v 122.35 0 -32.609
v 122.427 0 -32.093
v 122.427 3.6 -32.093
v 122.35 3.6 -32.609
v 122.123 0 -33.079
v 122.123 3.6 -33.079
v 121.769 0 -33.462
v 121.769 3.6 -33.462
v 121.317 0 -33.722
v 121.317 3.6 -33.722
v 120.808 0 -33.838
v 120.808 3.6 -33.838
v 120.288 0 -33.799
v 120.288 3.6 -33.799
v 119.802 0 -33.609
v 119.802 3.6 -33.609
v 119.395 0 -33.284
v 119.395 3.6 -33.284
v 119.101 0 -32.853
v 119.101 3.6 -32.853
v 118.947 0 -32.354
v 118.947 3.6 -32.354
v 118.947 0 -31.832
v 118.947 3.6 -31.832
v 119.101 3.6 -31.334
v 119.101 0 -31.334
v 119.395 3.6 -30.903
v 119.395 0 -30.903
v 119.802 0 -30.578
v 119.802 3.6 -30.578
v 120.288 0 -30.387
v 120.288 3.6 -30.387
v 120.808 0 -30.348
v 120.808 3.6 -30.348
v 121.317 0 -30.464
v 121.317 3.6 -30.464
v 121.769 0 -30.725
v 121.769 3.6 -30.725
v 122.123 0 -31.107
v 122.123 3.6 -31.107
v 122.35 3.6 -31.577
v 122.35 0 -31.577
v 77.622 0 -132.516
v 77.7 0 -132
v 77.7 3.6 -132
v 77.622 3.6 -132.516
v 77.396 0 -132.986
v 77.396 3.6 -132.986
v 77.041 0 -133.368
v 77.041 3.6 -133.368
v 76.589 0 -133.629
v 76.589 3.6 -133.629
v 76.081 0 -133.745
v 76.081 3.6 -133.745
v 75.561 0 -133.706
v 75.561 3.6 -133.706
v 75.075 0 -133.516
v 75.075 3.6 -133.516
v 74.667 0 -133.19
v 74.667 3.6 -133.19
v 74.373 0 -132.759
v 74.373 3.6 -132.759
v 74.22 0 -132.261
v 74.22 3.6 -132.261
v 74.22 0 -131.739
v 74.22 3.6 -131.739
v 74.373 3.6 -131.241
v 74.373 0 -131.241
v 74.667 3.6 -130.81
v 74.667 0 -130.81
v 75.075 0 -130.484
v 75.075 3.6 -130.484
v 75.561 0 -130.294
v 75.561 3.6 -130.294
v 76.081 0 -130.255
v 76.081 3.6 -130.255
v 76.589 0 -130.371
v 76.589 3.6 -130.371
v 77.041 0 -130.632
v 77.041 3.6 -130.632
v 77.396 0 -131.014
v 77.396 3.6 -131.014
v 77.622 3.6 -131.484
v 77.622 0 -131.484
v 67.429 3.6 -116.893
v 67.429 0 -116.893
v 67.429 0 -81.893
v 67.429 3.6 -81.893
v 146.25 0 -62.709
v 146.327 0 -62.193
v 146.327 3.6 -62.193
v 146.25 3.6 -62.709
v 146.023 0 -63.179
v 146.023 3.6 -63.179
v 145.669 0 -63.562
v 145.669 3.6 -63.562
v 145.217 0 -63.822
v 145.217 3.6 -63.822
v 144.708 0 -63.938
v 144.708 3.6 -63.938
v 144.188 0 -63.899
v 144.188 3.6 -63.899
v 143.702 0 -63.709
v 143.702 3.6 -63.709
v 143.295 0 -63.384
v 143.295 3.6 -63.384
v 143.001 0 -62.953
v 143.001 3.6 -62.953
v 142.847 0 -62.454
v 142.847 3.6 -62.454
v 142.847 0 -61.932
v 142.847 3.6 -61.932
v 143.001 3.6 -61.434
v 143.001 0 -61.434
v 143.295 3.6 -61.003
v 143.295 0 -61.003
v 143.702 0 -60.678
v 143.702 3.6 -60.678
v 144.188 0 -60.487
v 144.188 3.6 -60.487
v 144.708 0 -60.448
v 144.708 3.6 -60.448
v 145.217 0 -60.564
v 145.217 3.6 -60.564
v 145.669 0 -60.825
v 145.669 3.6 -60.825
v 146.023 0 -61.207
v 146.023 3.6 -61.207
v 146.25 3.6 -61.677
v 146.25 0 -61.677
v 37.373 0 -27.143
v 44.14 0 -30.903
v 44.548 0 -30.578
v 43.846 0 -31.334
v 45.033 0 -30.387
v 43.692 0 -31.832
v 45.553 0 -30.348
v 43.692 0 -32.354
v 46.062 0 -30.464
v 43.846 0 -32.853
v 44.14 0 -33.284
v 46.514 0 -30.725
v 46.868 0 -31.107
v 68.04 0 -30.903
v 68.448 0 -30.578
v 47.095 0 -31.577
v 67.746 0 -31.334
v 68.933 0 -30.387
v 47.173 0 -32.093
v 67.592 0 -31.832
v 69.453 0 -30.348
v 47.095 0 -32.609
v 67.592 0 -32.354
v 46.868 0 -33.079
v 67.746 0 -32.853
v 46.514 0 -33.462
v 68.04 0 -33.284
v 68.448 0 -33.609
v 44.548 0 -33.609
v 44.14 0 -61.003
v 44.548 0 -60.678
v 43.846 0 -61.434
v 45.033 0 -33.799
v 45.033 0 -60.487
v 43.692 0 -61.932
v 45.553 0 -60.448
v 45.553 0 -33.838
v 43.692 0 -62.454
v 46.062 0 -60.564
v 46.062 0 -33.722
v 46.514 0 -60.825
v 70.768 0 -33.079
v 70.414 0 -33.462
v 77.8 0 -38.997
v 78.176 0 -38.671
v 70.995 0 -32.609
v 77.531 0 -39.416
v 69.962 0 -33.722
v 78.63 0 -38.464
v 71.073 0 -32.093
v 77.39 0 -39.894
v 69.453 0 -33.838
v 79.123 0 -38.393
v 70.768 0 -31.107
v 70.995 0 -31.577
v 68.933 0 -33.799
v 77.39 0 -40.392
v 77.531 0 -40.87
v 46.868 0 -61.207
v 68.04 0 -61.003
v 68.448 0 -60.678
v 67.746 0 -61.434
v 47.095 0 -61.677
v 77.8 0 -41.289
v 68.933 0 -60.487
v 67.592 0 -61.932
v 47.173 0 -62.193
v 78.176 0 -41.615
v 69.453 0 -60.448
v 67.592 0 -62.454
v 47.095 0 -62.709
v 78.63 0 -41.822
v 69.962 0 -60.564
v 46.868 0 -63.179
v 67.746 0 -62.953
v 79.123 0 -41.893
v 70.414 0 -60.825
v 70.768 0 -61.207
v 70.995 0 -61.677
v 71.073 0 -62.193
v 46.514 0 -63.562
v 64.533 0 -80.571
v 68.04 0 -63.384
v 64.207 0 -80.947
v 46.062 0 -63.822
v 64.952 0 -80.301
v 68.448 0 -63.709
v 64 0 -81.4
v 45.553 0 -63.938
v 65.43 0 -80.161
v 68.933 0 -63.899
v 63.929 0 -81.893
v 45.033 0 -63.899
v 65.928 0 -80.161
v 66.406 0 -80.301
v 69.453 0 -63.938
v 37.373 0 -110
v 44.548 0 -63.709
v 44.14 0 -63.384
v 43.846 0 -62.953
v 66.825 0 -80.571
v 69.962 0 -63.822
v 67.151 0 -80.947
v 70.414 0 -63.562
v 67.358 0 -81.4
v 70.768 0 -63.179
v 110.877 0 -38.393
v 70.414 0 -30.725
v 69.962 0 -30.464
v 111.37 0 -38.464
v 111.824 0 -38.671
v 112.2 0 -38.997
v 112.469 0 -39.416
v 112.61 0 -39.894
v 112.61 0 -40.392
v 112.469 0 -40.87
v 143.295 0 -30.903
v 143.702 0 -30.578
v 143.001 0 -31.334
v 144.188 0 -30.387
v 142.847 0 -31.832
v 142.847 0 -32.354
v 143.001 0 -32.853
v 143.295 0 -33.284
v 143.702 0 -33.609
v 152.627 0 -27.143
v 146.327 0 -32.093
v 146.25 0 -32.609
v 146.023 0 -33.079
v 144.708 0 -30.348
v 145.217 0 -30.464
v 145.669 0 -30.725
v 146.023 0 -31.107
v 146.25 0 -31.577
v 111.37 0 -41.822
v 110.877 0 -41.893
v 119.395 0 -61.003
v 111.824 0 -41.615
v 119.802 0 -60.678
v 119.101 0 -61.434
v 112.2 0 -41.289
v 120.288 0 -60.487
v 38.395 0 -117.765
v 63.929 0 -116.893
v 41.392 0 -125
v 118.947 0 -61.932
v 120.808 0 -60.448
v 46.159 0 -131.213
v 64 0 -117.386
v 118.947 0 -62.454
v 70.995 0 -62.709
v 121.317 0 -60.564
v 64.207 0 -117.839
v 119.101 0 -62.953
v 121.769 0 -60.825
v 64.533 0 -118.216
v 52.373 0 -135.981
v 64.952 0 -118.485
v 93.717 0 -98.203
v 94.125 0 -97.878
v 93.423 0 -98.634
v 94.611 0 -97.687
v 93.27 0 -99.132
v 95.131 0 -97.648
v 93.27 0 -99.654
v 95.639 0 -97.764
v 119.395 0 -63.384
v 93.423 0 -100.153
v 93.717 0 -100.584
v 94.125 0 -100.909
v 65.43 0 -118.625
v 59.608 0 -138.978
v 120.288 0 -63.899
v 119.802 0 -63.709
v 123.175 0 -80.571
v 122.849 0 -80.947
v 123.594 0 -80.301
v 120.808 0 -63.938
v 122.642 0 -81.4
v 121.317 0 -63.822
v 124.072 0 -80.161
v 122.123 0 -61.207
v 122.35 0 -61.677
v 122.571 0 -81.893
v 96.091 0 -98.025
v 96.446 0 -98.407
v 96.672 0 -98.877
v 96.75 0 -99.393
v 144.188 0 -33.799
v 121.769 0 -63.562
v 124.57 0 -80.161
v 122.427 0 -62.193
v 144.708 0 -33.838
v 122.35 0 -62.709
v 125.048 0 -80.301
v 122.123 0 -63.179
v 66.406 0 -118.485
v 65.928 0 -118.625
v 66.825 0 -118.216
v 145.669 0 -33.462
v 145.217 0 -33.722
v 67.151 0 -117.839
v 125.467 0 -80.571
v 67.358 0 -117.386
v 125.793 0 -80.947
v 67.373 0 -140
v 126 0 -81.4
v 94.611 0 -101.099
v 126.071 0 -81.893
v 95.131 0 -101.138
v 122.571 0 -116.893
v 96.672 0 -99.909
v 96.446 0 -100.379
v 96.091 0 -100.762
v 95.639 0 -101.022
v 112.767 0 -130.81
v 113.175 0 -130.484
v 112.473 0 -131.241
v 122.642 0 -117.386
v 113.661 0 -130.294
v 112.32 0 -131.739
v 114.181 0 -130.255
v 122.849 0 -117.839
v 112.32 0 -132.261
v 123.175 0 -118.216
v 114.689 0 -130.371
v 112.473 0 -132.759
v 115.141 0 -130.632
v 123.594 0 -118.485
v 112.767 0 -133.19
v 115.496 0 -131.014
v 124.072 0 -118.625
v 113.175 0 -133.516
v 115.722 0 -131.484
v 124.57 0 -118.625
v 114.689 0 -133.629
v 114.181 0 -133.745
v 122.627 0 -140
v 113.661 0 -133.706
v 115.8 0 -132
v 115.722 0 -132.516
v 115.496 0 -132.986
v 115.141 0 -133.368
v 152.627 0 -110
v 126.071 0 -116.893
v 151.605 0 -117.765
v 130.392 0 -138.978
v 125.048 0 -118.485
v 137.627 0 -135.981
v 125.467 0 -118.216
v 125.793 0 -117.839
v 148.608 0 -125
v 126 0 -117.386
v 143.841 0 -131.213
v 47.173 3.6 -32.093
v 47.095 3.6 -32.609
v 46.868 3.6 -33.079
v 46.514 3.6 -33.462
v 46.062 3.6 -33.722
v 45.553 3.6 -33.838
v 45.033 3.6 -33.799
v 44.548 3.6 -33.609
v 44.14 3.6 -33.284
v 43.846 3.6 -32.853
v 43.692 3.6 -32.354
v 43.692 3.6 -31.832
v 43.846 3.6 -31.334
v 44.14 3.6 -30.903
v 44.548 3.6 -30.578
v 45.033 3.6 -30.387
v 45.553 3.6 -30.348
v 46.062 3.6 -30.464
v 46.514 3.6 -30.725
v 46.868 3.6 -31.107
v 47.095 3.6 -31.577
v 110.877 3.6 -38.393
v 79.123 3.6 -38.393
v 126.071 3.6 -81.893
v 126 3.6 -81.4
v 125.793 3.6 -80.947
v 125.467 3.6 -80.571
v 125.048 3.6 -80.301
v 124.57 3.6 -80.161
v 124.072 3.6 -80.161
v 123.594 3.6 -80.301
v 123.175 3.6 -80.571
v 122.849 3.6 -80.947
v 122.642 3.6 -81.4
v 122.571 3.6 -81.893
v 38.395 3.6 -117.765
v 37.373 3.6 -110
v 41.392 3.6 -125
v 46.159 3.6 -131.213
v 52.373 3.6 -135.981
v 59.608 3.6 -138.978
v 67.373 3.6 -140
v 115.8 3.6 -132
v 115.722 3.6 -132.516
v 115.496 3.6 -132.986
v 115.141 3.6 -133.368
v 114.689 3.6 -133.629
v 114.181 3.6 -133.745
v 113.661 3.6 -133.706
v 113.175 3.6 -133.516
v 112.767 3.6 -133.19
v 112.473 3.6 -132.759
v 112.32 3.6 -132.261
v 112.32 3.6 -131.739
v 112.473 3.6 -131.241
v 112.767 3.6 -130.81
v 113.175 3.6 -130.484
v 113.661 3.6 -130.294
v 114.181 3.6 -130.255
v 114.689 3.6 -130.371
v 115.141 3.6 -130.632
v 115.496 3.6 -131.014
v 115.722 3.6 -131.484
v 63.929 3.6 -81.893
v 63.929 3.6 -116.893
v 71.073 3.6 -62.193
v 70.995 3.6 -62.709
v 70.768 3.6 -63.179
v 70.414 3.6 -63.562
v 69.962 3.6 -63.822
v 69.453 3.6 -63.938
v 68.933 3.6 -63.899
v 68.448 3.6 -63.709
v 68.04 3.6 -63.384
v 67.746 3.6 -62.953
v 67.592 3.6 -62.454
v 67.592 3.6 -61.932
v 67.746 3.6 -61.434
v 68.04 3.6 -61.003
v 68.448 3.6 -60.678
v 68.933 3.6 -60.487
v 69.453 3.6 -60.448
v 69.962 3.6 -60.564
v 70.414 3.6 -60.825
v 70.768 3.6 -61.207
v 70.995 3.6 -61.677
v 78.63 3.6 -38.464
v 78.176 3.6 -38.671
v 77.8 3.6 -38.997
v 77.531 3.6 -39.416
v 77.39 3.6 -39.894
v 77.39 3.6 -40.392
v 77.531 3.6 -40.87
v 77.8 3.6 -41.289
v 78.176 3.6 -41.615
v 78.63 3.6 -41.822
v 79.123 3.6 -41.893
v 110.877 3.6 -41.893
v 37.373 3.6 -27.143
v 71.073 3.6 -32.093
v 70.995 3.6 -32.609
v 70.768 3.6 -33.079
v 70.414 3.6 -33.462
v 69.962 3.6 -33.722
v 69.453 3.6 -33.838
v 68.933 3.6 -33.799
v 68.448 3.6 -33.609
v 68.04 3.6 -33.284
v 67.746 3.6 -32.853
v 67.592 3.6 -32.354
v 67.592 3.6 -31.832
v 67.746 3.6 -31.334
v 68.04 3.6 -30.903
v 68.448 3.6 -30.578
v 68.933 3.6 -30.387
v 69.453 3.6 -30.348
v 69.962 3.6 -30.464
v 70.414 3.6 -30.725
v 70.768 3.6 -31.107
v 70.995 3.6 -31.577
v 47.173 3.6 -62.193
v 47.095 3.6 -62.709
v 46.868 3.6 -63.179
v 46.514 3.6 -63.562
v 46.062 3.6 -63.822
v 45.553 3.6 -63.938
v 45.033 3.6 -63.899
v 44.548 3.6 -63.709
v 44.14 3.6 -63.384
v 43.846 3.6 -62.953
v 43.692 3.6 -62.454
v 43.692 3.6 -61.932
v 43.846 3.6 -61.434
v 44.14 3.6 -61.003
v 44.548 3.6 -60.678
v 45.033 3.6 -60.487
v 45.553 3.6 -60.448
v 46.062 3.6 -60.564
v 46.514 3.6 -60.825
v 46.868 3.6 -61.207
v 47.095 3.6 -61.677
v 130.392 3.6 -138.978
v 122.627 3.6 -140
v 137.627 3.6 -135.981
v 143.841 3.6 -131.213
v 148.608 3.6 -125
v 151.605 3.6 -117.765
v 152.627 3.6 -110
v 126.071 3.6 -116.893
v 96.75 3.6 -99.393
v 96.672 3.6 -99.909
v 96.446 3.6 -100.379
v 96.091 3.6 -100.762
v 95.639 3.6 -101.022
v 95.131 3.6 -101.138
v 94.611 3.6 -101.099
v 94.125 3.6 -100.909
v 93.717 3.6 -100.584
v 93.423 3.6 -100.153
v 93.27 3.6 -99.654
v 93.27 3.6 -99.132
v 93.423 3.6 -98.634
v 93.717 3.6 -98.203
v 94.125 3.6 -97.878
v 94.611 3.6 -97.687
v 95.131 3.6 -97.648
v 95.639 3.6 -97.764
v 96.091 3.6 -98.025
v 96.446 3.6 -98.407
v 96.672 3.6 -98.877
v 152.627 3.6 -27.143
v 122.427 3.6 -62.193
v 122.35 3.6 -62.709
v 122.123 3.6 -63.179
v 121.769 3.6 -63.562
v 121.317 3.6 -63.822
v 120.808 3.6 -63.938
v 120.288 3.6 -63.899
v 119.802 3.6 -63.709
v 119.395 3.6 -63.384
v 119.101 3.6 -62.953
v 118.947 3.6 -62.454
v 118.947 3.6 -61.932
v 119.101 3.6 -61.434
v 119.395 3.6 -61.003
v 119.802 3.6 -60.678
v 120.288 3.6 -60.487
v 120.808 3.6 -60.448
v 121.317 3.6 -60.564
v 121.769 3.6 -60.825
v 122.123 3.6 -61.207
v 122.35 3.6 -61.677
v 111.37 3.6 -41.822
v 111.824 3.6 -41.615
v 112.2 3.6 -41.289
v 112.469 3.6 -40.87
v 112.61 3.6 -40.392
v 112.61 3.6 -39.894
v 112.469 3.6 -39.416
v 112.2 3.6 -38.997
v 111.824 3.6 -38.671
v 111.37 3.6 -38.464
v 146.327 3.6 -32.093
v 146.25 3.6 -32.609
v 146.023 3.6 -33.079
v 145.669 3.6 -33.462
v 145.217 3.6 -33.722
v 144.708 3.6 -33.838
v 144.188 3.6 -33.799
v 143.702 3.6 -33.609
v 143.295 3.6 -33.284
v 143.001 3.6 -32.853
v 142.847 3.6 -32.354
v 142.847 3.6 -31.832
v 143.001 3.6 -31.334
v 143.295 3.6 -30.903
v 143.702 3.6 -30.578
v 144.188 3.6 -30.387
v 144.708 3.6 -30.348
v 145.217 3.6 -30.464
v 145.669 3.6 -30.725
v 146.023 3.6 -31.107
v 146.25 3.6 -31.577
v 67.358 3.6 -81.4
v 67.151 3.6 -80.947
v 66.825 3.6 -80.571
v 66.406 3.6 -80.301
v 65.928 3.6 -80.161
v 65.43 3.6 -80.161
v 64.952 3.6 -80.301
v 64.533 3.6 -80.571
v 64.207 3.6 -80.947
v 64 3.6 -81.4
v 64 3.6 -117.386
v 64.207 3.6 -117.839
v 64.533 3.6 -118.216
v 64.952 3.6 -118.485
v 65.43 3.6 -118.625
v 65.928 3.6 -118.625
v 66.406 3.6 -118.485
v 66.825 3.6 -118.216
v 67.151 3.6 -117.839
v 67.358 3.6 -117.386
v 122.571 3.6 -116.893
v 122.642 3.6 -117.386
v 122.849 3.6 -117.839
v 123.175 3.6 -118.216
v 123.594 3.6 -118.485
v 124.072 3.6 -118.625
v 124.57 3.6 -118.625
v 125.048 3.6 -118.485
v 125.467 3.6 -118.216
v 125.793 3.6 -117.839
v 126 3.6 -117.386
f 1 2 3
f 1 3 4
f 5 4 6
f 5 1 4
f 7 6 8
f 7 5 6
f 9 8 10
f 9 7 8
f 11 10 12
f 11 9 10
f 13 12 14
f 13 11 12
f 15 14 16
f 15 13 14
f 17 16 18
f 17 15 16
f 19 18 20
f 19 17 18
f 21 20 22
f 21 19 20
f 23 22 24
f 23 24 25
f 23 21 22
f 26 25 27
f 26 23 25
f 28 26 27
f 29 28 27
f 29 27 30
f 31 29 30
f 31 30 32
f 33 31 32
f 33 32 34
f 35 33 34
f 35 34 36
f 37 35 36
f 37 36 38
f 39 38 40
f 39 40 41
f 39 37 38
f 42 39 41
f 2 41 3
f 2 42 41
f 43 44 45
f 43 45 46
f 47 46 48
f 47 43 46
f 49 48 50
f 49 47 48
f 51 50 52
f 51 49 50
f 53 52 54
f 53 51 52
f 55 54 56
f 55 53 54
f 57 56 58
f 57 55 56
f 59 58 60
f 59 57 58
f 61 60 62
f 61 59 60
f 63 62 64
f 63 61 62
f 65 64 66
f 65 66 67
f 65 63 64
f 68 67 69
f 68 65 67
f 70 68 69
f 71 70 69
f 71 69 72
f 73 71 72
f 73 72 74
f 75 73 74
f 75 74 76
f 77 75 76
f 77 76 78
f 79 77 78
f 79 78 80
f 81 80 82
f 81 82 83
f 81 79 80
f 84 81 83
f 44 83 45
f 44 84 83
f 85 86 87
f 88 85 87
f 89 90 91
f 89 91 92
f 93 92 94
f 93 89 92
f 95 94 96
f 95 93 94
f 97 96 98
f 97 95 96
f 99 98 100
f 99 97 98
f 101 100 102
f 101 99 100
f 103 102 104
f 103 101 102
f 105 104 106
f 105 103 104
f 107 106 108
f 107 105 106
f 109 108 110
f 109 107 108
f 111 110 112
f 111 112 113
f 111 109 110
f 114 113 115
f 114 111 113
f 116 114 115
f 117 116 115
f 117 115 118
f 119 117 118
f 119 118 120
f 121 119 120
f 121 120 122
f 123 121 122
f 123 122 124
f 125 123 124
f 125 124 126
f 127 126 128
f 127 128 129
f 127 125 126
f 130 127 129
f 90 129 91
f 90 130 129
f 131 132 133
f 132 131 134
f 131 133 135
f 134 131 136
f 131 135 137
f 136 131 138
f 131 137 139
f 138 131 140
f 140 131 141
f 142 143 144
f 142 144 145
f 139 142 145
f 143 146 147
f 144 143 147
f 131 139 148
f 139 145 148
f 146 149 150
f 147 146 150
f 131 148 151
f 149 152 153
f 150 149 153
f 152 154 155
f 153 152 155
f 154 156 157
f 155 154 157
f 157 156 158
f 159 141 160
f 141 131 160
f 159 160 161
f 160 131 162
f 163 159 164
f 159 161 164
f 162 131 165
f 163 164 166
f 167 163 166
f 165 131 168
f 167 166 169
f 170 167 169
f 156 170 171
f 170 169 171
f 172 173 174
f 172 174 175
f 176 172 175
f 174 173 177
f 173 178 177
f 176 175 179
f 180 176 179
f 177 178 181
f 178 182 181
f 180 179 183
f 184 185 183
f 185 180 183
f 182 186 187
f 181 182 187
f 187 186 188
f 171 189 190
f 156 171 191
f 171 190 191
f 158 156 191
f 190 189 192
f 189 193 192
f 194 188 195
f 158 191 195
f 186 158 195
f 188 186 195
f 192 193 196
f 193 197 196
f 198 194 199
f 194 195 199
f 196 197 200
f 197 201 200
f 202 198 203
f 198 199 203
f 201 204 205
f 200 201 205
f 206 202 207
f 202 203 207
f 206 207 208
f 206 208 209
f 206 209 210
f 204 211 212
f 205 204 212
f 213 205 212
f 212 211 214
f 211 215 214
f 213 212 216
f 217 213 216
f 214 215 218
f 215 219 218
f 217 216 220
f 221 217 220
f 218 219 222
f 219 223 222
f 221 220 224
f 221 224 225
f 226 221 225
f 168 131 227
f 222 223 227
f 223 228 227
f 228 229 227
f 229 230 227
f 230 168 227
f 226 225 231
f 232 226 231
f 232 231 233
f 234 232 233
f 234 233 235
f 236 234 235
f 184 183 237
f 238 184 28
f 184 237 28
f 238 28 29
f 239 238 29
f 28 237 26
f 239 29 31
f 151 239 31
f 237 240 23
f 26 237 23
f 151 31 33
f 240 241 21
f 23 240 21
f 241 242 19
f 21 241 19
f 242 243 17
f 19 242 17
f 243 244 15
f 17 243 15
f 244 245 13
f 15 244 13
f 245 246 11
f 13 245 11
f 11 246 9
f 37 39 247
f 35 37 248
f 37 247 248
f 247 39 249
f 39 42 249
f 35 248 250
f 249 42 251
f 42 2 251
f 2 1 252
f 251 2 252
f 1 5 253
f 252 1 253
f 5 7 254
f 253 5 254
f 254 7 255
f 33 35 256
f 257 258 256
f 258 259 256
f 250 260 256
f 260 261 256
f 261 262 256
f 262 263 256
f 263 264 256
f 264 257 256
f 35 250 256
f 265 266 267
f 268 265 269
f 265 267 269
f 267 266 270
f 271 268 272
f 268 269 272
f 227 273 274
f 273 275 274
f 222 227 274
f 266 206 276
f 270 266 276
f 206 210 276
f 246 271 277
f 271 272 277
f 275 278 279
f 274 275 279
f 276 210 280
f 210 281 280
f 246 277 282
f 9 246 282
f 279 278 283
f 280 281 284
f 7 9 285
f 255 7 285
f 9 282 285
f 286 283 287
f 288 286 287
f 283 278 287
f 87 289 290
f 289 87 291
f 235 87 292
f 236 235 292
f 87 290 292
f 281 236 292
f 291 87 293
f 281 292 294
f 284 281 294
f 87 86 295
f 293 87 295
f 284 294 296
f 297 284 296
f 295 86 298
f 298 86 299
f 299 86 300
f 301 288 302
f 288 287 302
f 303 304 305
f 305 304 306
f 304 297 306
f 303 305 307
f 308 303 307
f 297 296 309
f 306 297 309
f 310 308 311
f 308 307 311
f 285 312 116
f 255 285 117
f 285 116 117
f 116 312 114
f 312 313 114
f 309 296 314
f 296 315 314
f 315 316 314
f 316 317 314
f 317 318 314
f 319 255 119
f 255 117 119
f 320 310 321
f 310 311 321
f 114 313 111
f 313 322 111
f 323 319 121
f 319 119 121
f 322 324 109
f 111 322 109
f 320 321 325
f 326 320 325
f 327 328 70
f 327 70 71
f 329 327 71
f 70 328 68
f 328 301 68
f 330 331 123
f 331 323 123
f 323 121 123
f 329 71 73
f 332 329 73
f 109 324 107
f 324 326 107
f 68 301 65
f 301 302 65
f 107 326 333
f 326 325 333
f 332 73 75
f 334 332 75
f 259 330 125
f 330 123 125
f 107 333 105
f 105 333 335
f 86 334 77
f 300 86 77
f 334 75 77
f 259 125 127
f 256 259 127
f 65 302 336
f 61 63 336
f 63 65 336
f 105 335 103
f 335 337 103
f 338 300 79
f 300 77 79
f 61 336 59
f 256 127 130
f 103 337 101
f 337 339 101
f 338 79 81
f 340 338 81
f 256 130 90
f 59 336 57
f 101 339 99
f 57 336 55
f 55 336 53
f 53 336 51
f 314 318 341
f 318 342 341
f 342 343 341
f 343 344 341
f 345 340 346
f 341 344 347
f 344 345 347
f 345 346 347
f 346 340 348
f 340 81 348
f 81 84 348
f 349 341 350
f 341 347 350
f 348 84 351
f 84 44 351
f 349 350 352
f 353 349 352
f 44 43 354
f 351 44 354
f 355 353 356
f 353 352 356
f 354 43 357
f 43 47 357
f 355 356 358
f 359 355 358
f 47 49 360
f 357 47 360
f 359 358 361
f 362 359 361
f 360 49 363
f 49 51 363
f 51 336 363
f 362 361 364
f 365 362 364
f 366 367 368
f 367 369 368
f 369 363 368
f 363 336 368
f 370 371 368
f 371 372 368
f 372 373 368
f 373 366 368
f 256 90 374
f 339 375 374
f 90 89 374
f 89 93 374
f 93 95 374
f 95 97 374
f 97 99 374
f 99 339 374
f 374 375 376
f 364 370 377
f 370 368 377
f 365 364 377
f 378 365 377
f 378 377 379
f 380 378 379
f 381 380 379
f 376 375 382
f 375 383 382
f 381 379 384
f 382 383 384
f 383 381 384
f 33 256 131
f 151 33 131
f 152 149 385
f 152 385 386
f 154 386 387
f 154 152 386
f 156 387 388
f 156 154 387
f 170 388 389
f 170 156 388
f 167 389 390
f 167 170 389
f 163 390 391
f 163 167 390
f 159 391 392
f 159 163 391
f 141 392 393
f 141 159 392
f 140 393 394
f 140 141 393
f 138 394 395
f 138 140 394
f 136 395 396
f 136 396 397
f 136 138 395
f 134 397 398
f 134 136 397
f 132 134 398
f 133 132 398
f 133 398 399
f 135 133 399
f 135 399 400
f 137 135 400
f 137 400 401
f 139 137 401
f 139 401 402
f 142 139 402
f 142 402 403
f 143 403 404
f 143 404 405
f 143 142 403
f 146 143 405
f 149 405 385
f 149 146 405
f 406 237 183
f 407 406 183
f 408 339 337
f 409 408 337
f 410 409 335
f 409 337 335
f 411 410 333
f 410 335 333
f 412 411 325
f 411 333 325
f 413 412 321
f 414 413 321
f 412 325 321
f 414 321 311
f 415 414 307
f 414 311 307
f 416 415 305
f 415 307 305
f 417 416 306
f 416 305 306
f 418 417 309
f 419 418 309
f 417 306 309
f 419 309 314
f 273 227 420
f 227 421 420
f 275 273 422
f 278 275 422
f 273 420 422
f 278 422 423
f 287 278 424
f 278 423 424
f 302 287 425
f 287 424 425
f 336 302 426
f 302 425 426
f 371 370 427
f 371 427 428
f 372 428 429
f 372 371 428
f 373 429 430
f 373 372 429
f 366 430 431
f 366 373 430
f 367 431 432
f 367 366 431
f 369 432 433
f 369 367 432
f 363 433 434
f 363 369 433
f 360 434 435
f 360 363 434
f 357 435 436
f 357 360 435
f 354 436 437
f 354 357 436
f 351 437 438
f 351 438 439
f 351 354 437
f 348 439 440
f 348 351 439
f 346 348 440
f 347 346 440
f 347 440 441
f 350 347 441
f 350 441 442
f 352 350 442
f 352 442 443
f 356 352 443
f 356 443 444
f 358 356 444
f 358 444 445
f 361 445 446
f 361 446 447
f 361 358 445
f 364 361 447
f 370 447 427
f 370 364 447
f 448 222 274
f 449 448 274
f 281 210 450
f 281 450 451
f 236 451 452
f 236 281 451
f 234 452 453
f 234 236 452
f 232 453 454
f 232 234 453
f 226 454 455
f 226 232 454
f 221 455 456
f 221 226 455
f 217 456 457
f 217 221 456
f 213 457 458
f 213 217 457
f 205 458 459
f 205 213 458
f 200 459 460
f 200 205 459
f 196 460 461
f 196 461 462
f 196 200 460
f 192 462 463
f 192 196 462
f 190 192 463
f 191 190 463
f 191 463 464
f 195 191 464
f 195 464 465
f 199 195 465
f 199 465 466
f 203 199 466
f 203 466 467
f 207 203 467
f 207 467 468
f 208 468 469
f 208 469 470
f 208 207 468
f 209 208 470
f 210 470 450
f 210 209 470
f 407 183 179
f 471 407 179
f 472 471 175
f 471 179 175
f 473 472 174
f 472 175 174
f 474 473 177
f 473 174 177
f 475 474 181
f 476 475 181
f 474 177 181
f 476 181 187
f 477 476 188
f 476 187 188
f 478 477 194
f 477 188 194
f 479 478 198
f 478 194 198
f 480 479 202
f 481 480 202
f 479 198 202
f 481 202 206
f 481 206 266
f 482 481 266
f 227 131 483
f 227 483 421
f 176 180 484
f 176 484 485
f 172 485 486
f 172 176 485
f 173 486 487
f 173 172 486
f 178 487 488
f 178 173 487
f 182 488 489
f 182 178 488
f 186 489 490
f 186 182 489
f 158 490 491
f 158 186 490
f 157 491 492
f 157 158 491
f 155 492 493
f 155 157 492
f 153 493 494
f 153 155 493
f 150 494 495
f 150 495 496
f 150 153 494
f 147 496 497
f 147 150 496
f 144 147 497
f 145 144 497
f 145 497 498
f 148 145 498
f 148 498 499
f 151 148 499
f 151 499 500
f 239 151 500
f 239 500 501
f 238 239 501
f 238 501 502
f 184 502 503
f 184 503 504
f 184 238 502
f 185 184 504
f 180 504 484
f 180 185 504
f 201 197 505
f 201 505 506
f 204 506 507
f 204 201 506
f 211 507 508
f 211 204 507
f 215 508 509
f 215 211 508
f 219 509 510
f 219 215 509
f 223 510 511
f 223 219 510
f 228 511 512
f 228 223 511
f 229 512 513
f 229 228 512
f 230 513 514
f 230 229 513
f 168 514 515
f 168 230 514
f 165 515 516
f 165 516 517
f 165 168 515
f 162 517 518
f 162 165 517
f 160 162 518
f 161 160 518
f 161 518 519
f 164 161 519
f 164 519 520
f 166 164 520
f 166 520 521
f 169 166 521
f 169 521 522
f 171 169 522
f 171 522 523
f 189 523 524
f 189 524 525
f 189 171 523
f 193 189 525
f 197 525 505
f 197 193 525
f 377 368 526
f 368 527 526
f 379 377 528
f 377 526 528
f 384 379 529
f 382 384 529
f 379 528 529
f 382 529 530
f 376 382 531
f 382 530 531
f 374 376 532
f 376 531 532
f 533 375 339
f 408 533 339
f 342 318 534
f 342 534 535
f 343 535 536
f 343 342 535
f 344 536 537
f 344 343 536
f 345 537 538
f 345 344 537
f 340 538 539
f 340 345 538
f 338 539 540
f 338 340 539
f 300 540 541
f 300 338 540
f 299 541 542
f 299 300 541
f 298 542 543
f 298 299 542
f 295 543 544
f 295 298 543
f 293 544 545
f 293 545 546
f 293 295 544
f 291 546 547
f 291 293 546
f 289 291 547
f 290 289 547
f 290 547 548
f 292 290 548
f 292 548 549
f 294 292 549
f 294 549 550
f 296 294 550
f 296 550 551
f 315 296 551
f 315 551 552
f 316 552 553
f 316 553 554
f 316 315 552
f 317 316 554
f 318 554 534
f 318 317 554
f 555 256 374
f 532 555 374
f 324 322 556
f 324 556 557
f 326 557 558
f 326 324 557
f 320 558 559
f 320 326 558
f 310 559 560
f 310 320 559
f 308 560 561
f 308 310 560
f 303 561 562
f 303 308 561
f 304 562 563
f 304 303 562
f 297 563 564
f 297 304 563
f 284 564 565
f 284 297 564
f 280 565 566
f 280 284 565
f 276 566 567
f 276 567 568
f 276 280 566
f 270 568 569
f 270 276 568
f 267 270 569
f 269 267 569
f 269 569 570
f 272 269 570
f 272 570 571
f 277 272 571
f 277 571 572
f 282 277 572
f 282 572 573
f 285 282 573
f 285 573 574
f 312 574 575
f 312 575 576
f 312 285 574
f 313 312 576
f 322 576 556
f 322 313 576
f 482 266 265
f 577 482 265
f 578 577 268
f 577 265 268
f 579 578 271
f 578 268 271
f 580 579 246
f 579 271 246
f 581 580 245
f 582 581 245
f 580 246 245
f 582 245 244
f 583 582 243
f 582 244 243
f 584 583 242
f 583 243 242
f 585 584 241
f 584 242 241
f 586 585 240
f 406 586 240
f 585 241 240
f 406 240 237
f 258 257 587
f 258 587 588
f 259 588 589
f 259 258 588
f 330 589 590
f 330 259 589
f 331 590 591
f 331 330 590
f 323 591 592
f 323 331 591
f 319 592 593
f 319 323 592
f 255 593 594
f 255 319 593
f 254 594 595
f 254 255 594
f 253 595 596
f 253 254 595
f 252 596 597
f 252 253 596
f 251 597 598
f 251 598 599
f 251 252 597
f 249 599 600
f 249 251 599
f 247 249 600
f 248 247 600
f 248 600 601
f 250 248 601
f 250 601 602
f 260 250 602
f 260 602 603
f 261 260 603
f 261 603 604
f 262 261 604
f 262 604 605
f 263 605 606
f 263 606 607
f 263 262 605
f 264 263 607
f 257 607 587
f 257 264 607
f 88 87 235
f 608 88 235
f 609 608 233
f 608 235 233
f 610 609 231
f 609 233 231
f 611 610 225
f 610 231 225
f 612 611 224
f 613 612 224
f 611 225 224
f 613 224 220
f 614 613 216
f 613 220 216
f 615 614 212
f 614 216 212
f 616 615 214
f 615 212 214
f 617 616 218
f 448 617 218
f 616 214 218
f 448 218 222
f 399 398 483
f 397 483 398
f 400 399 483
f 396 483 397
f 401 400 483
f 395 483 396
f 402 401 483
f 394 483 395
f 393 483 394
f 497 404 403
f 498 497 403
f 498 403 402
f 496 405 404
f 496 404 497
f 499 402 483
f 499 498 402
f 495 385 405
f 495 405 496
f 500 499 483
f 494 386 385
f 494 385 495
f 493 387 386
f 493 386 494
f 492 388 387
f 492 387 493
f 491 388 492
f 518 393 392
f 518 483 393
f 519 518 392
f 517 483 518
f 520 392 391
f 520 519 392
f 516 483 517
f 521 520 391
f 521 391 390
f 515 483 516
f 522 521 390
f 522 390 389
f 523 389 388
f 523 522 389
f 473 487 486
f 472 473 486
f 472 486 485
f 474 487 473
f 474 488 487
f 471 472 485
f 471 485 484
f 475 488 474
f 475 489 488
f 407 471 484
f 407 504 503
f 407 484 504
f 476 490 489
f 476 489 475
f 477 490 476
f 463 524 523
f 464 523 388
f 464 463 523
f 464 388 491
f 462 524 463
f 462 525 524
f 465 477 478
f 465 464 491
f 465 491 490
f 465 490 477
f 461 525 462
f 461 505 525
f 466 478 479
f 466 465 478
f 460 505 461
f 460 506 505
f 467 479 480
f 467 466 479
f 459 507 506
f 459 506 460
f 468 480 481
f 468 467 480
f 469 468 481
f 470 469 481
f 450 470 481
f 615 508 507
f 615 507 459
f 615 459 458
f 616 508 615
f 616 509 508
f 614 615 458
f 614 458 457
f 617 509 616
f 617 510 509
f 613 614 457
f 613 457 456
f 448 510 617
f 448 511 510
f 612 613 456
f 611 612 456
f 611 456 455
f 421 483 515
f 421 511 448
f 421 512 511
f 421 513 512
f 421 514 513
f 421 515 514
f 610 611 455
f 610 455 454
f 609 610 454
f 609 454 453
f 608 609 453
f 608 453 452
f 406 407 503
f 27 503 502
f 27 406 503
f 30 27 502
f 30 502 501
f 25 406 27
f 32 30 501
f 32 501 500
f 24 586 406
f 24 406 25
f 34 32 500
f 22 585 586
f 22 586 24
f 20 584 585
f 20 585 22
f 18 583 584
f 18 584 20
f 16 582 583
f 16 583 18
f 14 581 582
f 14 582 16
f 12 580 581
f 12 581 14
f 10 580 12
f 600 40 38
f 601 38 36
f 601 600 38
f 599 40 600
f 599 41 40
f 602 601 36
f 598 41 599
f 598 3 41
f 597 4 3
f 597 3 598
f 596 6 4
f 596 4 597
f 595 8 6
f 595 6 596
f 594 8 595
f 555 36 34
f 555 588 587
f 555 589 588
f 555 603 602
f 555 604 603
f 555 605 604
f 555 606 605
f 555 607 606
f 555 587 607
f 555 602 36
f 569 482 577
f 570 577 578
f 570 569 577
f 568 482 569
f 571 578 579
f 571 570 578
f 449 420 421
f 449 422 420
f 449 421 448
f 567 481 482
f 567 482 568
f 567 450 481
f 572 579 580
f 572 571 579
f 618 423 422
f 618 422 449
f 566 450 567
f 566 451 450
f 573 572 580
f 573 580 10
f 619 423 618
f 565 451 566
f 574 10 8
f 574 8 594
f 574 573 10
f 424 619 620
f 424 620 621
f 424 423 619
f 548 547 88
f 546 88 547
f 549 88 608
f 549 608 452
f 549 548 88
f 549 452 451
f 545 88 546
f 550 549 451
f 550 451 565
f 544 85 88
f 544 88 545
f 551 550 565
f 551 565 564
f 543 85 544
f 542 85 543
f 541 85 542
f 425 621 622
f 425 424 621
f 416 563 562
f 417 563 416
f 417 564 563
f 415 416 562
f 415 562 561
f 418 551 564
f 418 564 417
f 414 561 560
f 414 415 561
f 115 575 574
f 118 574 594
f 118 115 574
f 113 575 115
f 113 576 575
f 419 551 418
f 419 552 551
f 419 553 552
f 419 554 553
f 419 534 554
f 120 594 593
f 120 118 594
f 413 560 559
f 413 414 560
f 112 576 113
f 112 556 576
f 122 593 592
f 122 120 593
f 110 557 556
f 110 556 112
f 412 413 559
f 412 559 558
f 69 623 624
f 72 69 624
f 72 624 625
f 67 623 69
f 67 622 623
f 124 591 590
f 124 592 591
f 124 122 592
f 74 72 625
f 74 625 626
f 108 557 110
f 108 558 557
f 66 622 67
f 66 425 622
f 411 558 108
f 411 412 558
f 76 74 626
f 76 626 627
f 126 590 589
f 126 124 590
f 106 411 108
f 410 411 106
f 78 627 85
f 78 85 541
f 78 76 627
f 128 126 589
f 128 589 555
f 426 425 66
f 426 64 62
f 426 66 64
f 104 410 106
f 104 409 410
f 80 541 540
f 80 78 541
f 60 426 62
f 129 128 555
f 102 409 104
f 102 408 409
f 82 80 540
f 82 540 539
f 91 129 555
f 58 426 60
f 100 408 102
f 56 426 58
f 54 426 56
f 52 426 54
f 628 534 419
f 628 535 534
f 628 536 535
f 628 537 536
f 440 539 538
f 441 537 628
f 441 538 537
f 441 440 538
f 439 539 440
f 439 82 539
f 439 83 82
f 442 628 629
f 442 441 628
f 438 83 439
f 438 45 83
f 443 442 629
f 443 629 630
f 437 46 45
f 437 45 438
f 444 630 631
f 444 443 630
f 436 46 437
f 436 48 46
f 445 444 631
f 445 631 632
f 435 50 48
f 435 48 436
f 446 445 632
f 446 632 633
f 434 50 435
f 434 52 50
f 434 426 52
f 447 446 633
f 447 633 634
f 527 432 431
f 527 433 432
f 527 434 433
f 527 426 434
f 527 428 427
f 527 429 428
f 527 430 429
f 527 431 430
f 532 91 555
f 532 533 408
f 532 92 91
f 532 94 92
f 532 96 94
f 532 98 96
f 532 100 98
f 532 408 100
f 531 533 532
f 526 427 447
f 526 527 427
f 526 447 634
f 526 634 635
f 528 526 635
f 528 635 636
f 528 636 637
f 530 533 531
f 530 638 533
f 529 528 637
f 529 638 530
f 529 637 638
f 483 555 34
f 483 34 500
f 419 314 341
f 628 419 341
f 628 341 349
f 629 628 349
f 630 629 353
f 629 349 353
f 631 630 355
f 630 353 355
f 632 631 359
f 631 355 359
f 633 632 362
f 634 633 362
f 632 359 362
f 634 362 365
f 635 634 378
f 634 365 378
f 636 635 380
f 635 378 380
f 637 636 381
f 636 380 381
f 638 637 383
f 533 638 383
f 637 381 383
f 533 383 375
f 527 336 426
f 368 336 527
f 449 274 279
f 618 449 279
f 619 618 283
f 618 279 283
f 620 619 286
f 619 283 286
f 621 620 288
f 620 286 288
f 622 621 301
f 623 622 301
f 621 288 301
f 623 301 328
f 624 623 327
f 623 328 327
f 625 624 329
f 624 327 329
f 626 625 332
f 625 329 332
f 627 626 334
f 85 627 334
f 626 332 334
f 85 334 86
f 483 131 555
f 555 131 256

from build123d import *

# Parameters (mm, degrees)
SKETCH_6_W      = 115.2549118
SKETCH_6_H      = 112.856705034
SKETCH_6_R      = 1.75
EXTRUDE_1_DEPTH = 3.6
FILLET_2_R      = 30
FILLET_3_R      = 30


with BuildPart() as part:
    # 草图6 → 凸台-拉伸1 (new body)
    with BuildSketch(Plane(origin=(0, 0, 0), x_dir=(1, 0, 0), z_dir=(0, 1, 0))):
        with Locations((95, 83.571647483)):
            Rectangle(SKETCH_6_W, SKETCH_6_H)
        with BuildLine():
            Line((79.1225441, 41.893294966), (110.8774559, 41.893294966))
            ThreePointArc((110.8774559, 41.893294966), (112.6274559, 40.143294966), (110.8774559, 38.393294966))
            Line((110.8774559, 38.393294966), (79.1225441, 38.393294966))
            ThreePointArc((79.1225441, 38.393294966), (77.3725441, 40.143294966), (79.1225441, 41.893294966))
        make_face(mode=Mode.SUBTRACT)
        with Locations((45.4225441, 32.093294966)):
            Circle(SKETCH_6_R, mode=Mode.SUBTRACT)
        with Locations((69.3225441, 32.093294966)):
            Circle(SKETCH_6_R, mode=Mode.SUBTRACT)
        with Locations((45.4225441, 62.193294966)):
            Circle(SKETCH_6_R, mode=Mode.SUBTRACT)
        with Locations((69.3225441, 62.193294966)):
            Circle(SKETCH_6_R, mode=Mode.SUBTRACT)
        with Locations((120.6774559, 32.093294966)):
            Circle(SKETCH_6_R, mode=Mode.SUBTRACT)
        with Locations((144.5774559, 32.093294966)):
            Circle(SKETCH_6_R, mode=Mode.SUBTRACT)
        with Locations((120.6774559, 62.193294966)):
            Circle(SKETCH_6_R, mode=Mode.SUBTRACT)
        with Locations((144.5774559, 62.193294966)):
            Circle(SKETCH_6_R, mode=Mode.SUBTRACT)
        with BuildLine():
            ThreePointArc((67.429104265, 81.893294966), (65.679104265, 80.143294966), (63.929104265, 81.893294966))
            Line((63.929104265, 81.893294966), (63.929104265, 116.893294966))
            ThreePointArc((63.929104265, 116.893294966), (65.679104265, 118.643294966), (67.429104265, 116.893294966))
            Line((67.429104265, 116.893294966), (67.429104265, 81.893294966))
        make_face(mode=Mode.SUBTRACT)
        with Locations((95, 99.393294966)):
            Circle(SKETCH_6_R, mode=Mode.SUBTRACT)
        with Locations((75.95, 132)):
            Circle(SKETCH_6_R, mode=Mode.SUBTRACT)
        with BuildLine():
            Line((126.070895735, 116.893294966), (126.070895735, 81.893294966))
            ThreePointArc((126.070895735, 81.893294966), (124.320895735, 80.143294966), (122.570895735, 81.893294966))
            Line((122.570895735, 81.893294966), (122.570895735, 116.893294966))
            ThreePointArc((122.570895735, 116.893294966), (124.320895735, 118.643294966), (126.070895735, 116.893294966))
        make_face(mode=Mode.SUBTRACT)
        with Locations((114.05, 132)):
            Circle(SKETCH_6_R, mode=Mode.SUBTRACT)
    extrude(amount=EXTRUDE_1_DEPTH)

    # 圆角2
    fillet_2_edges = [part.edges().sort_by_distance(p)[0] for p in [
        (37.3725441, 1.8, -140),
    ]]
    fillet(fillet_2_edges, radius=FILLET_2_R)

    # 圆角3
    fillet_3_edges = [part.edges().sort_by_distance(p)[0] for p in [
        (152.6274559, 1.8, -140),
    ]]
    fillet(fillet_3_edges, radius=FILLET_3_R)


solid = part.part
